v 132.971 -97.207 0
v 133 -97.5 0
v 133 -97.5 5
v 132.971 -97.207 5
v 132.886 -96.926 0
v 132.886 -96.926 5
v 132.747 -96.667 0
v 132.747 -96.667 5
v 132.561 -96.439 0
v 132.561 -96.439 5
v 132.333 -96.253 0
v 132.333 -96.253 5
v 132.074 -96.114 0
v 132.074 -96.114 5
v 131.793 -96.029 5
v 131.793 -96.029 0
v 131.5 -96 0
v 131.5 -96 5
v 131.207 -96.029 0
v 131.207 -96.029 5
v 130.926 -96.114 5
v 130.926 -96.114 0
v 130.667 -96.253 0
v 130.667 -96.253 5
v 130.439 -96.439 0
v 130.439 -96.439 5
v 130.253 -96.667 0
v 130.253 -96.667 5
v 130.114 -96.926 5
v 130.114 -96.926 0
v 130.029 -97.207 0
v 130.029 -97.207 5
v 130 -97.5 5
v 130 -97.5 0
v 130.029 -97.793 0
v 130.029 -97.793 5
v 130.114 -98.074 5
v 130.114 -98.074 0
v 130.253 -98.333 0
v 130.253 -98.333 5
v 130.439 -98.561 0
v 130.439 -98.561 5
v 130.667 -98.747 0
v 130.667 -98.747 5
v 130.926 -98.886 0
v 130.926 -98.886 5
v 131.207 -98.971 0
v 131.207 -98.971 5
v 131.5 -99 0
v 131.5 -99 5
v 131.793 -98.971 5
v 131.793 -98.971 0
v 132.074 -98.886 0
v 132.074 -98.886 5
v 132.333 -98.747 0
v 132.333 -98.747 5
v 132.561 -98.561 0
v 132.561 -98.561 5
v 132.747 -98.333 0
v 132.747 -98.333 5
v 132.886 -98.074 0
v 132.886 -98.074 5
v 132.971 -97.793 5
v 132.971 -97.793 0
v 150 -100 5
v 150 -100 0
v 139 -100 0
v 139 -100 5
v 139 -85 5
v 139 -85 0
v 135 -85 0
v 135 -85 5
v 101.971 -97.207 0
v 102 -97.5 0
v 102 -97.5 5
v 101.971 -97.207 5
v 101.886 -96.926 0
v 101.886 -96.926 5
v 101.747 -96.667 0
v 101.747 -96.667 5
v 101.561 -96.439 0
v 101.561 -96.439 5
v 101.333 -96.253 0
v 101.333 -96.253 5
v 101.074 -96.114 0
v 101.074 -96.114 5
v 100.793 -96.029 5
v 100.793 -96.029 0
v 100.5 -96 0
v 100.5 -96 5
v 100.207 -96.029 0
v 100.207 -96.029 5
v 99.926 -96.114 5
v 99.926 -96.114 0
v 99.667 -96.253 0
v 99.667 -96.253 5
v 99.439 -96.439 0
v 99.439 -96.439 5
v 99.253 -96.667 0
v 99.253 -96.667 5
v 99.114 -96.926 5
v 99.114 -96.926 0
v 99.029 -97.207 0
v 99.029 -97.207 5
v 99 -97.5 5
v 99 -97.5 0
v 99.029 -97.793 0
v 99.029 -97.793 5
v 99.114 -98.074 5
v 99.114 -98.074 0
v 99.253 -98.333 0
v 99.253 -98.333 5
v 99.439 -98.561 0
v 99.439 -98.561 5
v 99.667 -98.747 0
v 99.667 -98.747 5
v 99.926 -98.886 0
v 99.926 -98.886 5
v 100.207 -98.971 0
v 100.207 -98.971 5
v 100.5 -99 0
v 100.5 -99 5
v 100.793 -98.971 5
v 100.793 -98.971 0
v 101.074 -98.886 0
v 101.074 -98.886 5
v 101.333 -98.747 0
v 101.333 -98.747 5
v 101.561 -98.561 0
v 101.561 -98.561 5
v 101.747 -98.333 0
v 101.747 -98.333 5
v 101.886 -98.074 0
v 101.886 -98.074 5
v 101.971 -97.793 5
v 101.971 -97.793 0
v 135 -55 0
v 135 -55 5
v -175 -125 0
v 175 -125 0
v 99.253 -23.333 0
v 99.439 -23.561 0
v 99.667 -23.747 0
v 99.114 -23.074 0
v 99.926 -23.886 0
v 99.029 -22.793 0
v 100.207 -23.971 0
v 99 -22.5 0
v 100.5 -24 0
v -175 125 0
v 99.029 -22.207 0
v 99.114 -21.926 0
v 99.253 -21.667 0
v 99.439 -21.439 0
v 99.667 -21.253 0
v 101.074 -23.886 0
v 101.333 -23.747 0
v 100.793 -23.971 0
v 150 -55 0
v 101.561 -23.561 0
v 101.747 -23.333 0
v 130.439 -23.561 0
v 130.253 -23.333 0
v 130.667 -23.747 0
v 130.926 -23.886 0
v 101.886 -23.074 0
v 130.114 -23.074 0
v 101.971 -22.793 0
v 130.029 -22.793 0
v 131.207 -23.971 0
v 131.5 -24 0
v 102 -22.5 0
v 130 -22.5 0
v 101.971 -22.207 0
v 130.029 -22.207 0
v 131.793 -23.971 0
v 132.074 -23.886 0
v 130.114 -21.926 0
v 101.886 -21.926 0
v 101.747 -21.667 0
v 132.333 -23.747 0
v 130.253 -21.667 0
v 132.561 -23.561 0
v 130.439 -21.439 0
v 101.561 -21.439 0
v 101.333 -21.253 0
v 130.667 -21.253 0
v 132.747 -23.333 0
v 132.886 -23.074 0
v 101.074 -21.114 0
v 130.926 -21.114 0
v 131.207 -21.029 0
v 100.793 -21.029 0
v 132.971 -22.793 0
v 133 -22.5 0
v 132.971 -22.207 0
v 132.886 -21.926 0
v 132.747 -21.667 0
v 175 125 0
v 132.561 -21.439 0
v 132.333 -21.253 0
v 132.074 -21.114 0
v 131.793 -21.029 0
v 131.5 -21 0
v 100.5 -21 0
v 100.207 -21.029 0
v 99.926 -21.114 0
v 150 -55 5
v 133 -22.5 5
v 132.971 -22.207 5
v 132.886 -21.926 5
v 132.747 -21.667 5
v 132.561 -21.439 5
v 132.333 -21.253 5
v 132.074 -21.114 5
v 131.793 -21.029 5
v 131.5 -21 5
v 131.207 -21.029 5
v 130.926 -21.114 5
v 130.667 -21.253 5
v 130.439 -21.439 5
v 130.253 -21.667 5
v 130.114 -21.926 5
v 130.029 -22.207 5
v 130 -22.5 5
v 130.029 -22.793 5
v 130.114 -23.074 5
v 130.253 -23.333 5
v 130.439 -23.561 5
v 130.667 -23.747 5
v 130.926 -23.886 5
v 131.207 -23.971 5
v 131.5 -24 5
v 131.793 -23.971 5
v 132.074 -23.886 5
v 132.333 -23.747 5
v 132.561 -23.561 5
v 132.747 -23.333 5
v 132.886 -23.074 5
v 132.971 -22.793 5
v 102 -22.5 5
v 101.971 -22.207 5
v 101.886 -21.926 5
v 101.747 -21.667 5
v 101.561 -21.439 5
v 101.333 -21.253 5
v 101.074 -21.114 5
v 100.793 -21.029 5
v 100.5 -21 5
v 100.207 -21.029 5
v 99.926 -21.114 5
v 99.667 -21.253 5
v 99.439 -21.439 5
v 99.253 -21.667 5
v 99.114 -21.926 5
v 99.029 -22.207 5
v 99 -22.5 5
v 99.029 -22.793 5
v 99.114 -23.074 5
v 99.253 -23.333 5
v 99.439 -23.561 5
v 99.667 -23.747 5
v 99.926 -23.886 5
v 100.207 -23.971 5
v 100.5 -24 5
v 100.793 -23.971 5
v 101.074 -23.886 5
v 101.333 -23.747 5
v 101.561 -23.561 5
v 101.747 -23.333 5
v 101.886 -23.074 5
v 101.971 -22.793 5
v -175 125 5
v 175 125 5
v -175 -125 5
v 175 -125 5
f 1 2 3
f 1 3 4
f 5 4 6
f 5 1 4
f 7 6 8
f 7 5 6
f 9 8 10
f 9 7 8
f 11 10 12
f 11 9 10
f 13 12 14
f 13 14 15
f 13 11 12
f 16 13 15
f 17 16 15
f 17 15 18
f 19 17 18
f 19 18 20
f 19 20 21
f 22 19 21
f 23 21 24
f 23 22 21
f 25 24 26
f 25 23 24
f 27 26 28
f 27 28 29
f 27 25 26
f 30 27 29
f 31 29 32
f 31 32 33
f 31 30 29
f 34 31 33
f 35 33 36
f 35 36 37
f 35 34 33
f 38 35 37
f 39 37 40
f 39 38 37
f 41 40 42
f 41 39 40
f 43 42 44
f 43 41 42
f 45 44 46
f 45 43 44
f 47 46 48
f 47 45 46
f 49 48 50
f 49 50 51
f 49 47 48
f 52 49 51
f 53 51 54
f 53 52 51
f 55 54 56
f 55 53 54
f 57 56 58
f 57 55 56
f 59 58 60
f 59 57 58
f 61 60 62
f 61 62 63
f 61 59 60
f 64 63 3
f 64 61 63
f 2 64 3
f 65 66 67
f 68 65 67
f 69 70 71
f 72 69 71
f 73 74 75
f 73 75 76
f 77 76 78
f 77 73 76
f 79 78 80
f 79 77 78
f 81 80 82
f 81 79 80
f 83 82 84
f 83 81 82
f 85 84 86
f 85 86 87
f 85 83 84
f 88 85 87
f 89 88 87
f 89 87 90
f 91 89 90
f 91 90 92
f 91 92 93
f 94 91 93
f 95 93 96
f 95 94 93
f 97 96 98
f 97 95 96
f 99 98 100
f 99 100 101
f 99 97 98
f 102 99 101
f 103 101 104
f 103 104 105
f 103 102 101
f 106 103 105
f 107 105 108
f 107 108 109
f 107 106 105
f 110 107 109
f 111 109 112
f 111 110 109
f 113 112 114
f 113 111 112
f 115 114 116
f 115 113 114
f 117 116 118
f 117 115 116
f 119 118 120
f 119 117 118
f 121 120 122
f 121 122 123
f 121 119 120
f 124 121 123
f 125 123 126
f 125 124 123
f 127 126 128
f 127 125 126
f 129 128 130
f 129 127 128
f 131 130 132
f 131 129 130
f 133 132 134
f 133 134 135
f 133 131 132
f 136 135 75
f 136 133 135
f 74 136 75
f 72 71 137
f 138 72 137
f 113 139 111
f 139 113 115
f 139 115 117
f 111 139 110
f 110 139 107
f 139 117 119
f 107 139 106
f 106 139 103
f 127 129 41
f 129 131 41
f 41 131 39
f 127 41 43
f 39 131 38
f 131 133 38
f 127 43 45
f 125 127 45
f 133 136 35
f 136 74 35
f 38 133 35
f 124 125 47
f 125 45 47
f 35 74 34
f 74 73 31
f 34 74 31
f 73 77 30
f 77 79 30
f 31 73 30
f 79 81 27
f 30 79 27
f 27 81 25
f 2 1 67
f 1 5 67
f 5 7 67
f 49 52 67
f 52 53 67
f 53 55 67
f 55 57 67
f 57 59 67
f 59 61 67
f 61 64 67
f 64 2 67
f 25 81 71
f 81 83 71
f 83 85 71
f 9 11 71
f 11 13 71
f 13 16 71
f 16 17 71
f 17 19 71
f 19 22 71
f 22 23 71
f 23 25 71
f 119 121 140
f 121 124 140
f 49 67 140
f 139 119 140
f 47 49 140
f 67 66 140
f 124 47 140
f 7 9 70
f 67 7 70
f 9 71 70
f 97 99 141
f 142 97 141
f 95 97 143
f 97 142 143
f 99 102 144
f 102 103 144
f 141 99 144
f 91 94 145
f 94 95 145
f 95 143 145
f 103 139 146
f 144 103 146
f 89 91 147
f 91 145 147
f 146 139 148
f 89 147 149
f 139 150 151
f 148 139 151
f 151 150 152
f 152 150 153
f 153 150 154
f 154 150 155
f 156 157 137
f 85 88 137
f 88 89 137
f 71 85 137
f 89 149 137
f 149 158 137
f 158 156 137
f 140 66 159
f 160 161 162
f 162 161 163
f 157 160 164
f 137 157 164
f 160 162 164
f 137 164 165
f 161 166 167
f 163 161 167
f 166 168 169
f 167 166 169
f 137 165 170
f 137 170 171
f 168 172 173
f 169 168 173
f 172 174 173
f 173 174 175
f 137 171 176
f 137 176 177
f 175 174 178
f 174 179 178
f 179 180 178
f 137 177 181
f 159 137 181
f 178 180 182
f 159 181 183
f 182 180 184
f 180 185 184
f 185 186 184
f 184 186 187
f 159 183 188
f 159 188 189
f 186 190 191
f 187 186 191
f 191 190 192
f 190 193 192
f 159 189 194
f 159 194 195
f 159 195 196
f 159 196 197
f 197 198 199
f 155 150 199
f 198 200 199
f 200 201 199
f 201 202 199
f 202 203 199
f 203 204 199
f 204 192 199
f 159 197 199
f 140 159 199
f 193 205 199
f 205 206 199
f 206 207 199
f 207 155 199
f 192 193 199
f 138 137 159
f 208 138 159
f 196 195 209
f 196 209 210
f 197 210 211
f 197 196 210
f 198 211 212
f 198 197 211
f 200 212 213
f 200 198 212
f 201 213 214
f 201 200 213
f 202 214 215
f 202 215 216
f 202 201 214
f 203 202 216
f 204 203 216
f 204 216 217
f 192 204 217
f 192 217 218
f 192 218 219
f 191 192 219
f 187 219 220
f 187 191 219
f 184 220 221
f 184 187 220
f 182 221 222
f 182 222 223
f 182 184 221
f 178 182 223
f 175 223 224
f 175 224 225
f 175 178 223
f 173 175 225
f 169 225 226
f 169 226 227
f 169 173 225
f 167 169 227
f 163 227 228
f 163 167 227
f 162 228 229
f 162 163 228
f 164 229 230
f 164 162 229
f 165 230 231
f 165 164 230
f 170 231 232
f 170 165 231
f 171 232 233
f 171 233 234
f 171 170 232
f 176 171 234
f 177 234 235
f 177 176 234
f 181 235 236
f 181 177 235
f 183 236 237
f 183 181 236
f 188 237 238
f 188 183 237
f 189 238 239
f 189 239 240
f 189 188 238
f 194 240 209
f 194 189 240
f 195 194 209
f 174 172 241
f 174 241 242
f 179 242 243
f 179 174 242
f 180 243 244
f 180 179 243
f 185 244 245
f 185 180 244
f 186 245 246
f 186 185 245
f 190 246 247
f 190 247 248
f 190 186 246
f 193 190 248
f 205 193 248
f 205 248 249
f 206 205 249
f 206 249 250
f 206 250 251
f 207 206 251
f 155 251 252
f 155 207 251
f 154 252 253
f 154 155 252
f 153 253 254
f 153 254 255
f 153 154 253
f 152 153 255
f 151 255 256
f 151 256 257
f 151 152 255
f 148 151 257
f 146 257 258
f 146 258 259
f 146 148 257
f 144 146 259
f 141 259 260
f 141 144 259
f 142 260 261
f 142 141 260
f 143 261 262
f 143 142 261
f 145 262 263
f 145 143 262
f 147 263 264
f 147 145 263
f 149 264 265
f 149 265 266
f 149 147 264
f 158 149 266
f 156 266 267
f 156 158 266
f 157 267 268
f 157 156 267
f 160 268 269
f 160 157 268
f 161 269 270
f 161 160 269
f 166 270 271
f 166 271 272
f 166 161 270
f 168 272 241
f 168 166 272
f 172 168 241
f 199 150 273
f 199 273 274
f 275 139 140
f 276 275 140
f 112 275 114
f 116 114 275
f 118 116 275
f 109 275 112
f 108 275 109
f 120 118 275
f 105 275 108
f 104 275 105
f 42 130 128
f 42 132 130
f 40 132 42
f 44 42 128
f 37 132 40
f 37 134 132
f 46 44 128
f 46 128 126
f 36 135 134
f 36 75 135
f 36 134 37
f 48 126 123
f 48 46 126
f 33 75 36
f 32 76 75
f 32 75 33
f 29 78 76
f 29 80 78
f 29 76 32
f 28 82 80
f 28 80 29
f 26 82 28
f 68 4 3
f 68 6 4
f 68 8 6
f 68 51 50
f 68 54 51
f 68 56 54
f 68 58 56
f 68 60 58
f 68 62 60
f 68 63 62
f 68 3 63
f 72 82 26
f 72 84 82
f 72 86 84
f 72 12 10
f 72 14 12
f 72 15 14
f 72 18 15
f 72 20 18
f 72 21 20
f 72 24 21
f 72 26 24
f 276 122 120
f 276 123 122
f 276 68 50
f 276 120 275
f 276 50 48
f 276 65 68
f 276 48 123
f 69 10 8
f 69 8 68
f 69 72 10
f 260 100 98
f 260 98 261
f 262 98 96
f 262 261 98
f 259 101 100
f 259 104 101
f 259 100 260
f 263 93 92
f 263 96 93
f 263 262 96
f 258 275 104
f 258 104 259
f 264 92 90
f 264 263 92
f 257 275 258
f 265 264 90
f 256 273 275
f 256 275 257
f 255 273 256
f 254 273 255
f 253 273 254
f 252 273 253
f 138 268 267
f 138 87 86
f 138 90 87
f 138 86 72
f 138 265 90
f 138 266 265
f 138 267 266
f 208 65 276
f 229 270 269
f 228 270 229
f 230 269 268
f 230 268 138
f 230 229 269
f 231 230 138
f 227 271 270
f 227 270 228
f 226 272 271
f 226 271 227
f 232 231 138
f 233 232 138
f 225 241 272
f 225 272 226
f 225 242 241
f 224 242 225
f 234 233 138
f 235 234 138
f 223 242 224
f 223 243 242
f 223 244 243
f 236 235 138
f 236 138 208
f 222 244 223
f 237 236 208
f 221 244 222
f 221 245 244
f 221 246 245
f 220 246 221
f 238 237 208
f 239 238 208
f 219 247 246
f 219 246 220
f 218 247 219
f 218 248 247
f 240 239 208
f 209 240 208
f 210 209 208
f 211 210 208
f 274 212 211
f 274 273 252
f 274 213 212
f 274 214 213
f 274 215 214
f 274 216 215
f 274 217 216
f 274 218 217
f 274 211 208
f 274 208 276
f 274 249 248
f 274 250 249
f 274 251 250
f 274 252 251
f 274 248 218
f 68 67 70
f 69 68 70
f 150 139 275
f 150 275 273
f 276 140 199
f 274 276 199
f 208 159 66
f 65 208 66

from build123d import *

# Parameters (mm, degrees)
F0_W     = 350
F0_H     = 250
F0_R     = 1.5
F1_DEPTH = 5


with BuildPart() as f1:
    # F0 (on Top) → F1 (new body)
    with BuildSketch(Plane.XY):
        Rectangle(F0_W, F0_H)
        with Locations((100.5, -97.5)):
            Circle(F0_R, mode=Mode.SUBTRACT)
        with Locations((131.5, -97.5)):
            Circle(F0_R, mode=Mode.SUBTRACT)
        Polygon((135, -85), (135, -55), (150, -55), (150, -100), (139, -100), (139, -85), align=None, mode=Mode.SUBTRACT)
        with Locations((100.5, -22.5)):
            Circle(F0_R, mode=Mode.SUBTRACT)
        with Locations((131.5, -22.5)):
            Circle(F0_R, mode=Mode.SUBTRACT)
    extrude(amount=F1_DEPTH)


solid = f1.part
